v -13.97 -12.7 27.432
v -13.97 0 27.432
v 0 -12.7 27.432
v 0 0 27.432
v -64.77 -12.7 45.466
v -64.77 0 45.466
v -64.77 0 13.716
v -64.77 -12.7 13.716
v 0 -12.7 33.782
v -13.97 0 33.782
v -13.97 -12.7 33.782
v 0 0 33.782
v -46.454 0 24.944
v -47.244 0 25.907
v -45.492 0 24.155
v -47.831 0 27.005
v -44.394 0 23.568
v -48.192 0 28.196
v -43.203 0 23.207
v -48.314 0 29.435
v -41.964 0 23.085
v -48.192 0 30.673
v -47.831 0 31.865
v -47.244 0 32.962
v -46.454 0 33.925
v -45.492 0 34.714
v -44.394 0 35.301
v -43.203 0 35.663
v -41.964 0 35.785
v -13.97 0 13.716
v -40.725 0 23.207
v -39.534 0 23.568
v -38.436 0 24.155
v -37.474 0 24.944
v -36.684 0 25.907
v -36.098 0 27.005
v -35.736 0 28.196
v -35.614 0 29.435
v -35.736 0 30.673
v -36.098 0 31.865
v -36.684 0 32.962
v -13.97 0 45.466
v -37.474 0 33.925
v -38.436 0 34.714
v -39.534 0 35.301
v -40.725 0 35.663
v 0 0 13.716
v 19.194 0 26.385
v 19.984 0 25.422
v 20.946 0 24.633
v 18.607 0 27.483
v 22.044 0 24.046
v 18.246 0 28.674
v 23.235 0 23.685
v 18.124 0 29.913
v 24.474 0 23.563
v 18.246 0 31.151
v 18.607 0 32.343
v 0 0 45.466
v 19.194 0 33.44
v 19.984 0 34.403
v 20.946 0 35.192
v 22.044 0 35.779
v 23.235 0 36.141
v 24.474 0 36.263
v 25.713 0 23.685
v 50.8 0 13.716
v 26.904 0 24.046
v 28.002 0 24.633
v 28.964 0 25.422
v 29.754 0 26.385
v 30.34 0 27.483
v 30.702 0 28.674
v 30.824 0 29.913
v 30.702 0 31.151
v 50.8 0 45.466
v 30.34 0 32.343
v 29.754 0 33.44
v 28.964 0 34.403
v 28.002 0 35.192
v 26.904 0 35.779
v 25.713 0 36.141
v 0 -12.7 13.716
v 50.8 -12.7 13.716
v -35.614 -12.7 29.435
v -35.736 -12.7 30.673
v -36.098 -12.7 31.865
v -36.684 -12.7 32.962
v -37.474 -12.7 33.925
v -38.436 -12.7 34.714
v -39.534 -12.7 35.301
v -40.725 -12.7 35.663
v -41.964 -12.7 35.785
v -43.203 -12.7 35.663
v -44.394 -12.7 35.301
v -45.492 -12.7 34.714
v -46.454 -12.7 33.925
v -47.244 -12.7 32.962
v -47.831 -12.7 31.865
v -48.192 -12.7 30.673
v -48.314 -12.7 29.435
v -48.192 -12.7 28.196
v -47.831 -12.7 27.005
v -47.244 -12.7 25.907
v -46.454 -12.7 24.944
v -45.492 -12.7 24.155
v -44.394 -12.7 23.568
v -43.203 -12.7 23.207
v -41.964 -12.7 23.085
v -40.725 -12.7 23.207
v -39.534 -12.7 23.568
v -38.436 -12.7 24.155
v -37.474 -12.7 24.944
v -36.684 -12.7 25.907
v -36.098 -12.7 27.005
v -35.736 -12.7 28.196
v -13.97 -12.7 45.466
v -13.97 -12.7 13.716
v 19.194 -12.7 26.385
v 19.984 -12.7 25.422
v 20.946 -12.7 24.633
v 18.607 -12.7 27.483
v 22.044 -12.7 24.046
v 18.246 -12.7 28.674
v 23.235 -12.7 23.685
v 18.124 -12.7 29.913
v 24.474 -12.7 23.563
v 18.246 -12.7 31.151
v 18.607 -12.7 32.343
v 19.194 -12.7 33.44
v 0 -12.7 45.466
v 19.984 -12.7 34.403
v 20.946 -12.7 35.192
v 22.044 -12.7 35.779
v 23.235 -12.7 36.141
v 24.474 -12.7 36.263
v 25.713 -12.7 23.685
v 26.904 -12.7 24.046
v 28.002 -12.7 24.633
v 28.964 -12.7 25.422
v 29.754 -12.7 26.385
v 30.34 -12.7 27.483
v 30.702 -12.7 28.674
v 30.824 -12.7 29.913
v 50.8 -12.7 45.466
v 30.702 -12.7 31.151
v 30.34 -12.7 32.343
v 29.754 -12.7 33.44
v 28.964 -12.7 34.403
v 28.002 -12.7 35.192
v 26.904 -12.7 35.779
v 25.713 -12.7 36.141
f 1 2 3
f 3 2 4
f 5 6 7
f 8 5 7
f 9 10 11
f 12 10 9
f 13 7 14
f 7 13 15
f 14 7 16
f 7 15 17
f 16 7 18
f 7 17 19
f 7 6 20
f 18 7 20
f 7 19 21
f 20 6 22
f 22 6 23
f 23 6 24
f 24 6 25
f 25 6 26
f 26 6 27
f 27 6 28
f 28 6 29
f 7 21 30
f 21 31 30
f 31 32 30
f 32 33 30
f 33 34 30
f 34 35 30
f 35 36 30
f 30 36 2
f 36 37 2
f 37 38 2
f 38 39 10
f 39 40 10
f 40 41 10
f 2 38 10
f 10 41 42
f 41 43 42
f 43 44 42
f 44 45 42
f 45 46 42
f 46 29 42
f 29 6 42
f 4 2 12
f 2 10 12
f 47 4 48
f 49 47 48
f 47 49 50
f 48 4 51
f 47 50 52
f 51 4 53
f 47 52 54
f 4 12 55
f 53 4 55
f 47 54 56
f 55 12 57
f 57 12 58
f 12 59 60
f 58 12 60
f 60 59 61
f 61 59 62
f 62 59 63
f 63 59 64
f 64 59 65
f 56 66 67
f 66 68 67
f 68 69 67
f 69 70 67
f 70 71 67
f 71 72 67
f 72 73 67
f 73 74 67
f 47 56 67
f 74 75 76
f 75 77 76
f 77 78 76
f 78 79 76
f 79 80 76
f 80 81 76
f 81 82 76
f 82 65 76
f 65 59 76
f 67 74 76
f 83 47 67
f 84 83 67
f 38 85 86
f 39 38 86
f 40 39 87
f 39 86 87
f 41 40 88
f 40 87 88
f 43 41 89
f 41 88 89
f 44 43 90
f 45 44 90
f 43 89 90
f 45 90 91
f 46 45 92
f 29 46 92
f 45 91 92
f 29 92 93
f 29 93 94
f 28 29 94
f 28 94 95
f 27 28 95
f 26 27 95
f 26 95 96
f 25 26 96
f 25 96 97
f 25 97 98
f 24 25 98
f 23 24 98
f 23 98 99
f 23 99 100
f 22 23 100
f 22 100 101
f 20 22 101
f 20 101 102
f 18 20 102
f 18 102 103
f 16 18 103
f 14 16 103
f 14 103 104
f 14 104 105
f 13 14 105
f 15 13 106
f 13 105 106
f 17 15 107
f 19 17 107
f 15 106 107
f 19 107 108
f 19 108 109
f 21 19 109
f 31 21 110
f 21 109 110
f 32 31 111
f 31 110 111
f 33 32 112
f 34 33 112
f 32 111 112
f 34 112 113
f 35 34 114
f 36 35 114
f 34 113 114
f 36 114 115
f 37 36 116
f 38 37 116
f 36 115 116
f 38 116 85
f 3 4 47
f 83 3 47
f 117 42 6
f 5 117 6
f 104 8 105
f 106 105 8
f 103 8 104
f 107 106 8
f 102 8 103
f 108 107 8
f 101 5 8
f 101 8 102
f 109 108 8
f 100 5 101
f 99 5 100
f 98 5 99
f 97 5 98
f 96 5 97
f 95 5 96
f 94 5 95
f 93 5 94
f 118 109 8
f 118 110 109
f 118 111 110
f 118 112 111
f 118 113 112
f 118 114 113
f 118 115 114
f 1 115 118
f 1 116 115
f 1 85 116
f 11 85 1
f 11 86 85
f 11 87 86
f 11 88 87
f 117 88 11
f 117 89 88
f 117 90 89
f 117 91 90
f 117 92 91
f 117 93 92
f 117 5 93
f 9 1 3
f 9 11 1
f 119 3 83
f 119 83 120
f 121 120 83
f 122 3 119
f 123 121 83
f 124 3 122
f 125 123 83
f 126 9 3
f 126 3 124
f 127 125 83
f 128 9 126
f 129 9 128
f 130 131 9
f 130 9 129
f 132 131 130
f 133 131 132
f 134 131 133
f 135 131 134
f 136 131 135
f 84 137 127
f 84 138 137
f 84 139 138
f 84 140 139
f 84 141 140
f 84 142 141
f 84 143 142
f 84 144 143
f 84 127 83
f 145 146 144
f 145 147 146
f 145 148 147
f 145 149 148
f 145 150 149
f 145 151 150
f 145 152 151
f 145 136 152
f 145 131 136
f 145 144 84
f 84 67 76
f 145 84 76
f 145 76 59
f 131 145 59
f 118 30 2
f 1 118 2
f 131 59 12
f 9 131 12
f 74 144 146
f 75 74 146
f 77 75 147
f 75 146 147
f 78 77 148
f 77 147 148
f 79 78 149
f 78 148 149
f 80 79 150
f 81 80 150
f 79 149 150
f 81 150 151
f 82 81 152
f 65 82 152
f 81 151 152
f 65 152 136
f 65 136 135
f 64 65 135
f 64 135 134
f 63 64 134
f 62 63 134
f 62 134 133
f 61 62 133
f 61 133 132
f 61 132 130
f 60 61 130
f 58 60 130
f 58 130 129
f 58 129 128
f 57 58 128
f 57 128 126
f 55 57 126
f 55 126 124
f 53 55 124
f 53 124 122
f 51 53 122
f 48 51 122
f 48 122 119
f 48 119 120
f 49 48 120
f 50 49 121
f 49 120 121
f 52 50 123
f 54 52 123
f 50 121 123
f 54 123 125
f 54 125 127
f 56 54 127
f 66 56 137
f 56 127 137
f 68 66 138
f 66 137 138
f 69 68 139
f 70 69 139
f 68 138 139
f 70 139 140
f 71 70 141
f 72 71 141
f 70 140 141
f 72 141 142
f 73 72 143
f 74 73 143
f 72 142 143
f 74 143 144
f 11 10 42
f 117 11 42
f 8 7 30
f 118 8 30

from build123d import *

# Parameters (mm, degrees)
F0_W     = 13.97
F0_H     = 6.35
F1_DEPTH = 12.7
F2_R     = 6.35
F3_DEPTH = 25.4


with BuildPart() as f1:
    # F0 (on Front) → F1 (new body)
    with BuildSketch(Plane.XZ):
        Polygon((-13.97, 27.432009), (-13.97, 33.782009), (-13.97, 45.466005), (-64.77, 45.466005), (-64.77, 34.602262), (-64.77, 25.704423), (-64.77, 13.716005), (-13.97, 13.716005), align=None)
        Polygon((0, 45.466005), (0, 33.782009), (0, 27.432009), (0, 13.716005), (50.8, 13.716005), (50.8, 29.591005), (50.8, 35.010789), (50.8, 45.466005), align=None)
        with Locations((-6.985, 30.607009)):
            Rectangle(F0_W, F0_H)
    extrude(amount=F1_DEPTH)

    # F2 (on face) → F3 (cut)
    with BuildSketch(Plane.XZ.offset(12.7)):
        with Locations((-41.964256, 29.434583)):
            Circle(F2_R)
        with Locations((24.473708, 29.912554)):
            Circle(F2_R)
    extrude(amount=-F3_DEPTH, mode=Mode.SUBTRACT)


solid = f1.part
